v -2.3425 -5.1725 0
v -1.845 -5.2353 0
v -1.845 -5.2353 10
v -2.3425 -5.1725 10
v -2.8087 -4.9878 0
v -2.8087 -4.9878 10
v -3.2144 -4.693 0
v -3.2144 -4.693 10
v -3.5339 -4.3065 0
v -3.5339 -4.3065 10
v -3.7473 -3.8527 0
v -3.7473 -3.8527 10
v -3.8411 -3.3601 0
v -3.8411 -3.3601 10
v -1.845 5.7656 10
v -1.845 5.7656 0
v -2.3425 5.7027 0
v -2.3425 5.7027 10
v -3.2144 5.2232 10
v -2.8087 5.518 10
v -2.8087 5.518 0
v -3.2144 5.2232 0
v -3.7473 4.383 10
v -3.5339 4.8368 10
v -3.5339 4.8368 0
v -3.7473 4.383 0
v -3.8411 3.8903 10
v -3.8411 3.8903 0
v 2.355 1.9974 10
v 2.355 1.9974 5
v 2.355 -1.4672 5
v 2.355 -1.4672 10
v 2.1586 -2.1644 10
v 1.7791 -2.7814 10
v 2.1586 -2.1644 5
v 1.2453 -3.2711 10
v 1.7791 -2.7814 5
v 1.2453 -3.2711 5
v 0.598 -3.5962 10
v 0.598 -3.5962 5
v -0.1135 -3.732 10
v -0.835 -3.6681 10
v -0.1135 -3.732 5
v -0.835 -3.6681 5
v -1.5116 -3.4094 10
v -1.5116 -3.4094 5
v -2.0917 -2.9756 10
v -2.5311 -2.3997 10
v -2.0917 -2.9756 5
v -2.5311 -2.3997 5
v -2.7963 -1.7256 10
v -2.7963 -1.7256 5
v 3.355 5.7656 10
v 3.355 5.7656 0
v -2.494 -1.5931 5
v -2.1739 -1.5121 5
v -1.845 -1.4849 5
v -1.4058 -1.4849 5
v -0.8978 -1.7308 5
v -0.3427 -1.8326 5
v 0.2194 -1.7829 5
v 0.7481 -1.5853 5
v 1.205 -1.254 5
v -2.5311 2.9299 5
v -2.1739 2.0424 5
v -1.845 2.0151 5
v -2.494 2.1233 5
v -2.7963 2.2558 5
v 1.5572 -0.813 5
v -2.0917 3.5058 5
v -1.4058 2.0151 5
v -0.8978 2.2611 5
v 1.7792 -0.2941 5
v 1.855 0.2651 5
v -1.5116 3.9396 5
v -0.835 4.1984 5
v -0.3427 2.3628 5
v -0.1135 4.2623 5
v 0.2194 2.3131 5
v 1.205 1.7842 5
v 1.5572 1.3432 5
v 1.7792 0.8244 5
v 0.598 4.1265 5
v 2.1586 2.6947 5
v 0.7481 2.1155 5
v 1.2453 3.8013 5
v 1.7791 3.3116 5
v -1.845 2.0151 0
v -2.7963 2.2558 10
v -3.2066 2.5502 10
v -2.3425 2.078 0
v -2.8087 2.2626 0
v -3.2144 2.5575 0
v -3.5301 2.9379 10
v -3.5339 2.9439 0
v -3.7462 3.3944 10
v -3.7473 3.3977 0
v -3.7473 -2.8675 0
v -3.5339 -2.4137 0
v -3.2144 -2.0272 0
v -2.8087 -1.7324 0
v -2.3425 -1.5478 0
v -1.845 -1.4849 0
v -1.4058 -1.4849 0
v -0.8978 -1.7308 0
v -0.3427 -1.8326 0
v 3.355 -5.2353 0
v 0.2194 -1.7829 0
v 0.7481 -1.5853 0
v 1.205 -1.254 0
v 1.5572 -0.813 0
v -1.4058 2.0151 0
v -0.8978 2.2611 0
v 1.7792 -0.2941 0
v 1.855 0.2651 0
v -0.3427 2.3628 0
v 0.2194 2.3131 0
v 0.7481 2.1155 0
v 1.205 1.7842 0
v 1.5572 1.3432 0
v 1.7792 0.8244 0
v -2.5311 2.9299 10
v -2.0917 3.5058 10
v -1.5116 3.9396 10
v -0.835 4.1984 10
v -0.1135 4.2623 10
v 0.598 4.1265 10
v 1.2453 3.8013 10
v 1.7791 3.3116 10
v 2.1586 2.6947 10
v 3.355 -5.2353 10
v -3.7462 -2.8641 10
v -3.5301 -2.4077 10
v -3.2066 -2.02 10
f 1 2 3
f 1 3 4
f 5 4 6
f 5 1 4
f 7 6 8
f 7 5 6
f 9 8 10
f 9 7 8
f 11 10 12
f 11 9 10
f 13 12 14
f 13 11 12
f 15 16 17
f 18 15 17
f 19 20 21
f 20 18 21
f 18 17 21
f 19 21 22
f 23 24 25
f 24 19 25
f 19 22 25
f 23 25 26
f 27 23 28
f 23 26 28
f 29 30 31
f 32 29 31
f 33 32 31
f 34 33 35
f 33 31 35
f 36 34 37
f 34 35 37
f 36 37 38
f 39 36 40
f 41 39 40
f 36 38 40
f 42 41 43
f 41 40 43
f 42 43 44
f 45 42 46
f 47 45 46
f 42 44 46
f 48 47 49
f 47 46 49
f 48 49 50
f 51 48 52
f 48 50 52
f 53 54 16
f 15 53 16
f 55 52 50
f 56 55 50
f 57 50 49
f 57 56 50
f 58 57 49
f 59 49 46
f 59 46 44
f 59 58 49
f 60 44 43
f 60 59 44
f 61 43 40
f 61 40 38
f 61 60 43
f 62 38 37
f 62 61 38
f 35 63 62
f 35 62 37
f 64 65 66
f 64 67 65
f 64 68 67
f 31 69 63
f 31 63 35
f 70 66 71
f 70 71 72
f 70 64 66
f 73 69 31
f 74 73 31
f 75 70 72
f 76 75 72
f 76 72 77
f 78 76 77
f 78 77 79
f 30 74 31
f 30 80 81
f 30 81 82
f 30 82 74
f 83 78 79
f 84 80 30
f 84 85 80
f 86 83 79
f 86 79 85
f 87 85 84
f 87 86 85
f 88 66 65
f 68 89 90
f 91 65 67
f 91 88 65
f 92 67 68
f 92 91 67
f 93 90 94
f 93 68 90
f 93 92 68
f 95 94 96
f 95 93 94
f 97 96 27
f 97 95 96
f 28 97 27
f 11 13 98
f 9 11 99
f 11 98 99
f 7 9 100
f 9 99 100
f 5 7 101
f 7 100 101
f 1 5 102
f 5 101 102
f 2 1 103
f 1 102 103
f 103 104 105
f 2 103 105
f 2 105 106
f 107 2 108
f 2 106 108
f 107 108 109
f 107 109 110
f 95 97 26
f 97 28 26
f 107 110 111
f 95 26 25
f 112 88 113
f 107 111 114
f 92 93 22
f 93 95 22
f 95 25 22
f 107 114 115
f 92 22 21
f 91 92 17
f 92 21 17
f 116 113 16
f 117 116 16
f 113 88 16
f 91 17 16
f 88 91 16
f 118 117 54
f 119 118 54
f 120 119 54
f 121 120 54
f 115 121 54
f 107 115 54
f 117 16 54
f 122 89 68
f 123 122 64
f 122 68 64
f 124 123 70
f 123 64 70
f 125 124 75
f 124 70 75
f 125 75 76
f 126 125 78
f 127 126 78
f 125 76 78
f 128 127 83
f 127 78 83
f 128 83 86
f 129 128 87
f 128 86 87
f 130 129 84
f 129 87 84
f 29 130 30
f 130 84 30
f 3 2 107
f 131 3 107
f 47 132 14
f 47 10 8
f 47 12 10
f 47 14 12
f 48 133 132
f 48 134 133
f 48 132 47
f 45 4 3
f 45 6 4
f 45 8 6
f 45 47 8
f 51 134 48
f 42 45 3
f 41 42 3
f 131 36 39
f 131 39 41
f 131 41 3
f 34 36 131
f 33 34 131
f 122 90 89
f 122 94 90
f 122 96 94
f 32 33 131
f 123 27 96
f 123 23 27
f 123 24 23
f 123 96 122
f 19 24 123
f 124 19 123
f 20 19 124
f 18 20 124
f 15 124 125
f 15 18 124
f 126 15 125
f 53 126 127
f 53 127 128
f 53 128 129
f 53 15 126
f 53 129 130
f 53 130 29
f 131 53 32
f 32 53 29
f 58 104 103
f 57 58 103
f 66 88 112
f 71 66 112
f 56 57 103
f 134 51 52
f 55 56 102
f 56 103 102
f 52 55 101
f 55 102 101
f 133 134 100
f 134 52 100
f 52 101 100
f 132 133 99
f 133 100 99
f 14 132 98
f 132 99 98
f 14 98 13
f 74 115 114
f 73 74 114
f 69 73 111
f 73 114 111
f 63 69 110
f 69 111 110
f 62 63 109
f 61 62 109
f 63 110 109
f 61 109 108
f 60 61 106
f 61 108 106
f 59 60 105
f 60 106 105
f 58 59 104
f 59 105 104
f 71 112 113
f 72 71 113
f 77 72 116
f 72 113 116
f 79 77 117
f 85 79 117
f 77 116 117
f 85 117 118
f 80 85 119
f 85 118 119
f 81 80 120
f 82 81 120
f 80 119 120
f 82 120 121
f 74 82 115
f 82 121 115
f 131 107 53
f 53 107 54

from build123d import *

# Parameters (mm, degrees)
F1_DEPTH    = 10
F2_DEPTH    = 5
F3_T1_DEPTH = 20


# Not quite as in the source:
# - a fillet or chamfer that OpenCascade refuses, or shapes differently, is made with other operations: its cross-section is extruded or revolved along the edge and cut away or added


with BuildPart() as f1:
    # F0 (on Top) → F1 (new body)
    with BuildSketch(Plane.XY):
        with BuildLine():
            ThreePointArc((-2.8424912948, 2.0151155274), (-0.2360435678, 4.2655420814), (2.3550239983, 1.9974242942))
            Line((2.3550239983, 1.9974242942), (2.3550239983, -1.4671932394))
            ThreePointArc((2.3550239983, -1.4671932394), (-0.2360435678, -3.7353110266), (-2.8424912948, -1.4848844726))
            Line((-2.8424912948, -1.4848844726), (-3.8449760017, -1.4848844726))
            Line((-3.8449760017, -1.4848844726), (-3.8449760017, -5.2353262286))
            Line((-3.8449760017, -5.2353262286), (3.3550239983, -5.2353262286))
            Line((3.3550239983, -5.2353262286), (3.3550239983, 5.7655572834))
            Line((3.3550239983, 5.7655572834), (-3.8449760017, 5.7655572834))
            Line((-3.8449760017, 5.7655572834), (-3.8449760017, 2.0151155274))
            Line((-3.8449760017, 2.0151155274), (-2.8424912948, 2.0151155274))
        make_face()
    extrude(amount=F1_DEPTH)

    # F0 (on Top) → F2 (join)
    with BuildSketch(Plane.XY):
        with BuildLine():
            Line((2.3550239983, -1.4671932394), (2.3550239983, 1.9974242942))
            ThreePointArc((2.3550239983, 1.9974242942), (-0.2360435678, 4.2655420814), (-2.8424912948, 2.0151155274))
            Line((-2.8424912948, 2.0151155274), (-1.4057946783, 2.0151155274))
            ThreePointArc((-1.4057946783, 2.0151155274), (0.7480700142, 2.1154829532), (1.8550239983, 0.2651155274))
            ThreePointArc((1.8550239983, 0.2651155274), (0.7480700142, -1.5852518984), (-1.4057946783, -1.4848844726))
            Line((-1.4057946783, -1.4848844726), (-2.8424912948, -1.4848844726))
            ThreePointArc((-2.8424912948, -1.4848844726), (-0.2360435678, -3.7353110266), (2.3550239983, -1.4671932394))
        make_face()
    extrude(amount=F2_DEPTH)

    # F3: fillet of radius 2 on 4 edges, made by hand

    # F3_s2 → F3_t1 (cut)
    with BuildSketch(Plane.XY.offset(-5)):
        with BuildLine():
            ThreePointArc((-1.8449760017, 2.0151155274), (-3.259189564, 2.600901965), (-3.8449760017, 4.0151155274))
            Line((-3.8449760017, 4.0151155274), (-3.8449760017, 2.0151155274))
            Line((-3.8449760017, 2.0151155274), (-1.8449760017, 2.0151155274))
        make_face()
        with BuildLine():
            ThreePointArc((-1.8449760017, -1.4848844726), (-3.259189564, -2.0706709102), (-3.8449760017, -3.4848844726))
            Line((-3.8449760017, -3.4848844726), (-3.8449760017, -1.4848844726))
            Line((-3.8449760017, -1.4848844726), (-1.8449760017, -1.4848844726))
        make_face()
        with BuildLine():
            ThreePointArc((-1.8449760017, -5.2353262286), (-3.259189564, -4.6495397909), (-3.8449760017, -3.2353262286))
            Line((-3.8449760017, -3.2353262286), (-3.8449760017, -5.2353262286))
            Line((-3.8449760017, -5.2353262286), (-1.8449760017, -5.2353262286))
        make_face()
        with BuildLine():
            ThreePointArc((-1.8449760017, 5.7655572834), (-3.259189564, 5.1797708458), (-3.8449760017, 3.7655572834))
            Line((-3.8449760017, 3.7655572834), (-3.8449760017, 5.7655572834))
            Line((-3.8449760017, 5.7655572834), (-1.8449760017, 5.7655572834))
        make_face()
    extrude(amount=F3_T1_DEPTH, mode=Mode.SUBTRACT)


solid = f1.part
